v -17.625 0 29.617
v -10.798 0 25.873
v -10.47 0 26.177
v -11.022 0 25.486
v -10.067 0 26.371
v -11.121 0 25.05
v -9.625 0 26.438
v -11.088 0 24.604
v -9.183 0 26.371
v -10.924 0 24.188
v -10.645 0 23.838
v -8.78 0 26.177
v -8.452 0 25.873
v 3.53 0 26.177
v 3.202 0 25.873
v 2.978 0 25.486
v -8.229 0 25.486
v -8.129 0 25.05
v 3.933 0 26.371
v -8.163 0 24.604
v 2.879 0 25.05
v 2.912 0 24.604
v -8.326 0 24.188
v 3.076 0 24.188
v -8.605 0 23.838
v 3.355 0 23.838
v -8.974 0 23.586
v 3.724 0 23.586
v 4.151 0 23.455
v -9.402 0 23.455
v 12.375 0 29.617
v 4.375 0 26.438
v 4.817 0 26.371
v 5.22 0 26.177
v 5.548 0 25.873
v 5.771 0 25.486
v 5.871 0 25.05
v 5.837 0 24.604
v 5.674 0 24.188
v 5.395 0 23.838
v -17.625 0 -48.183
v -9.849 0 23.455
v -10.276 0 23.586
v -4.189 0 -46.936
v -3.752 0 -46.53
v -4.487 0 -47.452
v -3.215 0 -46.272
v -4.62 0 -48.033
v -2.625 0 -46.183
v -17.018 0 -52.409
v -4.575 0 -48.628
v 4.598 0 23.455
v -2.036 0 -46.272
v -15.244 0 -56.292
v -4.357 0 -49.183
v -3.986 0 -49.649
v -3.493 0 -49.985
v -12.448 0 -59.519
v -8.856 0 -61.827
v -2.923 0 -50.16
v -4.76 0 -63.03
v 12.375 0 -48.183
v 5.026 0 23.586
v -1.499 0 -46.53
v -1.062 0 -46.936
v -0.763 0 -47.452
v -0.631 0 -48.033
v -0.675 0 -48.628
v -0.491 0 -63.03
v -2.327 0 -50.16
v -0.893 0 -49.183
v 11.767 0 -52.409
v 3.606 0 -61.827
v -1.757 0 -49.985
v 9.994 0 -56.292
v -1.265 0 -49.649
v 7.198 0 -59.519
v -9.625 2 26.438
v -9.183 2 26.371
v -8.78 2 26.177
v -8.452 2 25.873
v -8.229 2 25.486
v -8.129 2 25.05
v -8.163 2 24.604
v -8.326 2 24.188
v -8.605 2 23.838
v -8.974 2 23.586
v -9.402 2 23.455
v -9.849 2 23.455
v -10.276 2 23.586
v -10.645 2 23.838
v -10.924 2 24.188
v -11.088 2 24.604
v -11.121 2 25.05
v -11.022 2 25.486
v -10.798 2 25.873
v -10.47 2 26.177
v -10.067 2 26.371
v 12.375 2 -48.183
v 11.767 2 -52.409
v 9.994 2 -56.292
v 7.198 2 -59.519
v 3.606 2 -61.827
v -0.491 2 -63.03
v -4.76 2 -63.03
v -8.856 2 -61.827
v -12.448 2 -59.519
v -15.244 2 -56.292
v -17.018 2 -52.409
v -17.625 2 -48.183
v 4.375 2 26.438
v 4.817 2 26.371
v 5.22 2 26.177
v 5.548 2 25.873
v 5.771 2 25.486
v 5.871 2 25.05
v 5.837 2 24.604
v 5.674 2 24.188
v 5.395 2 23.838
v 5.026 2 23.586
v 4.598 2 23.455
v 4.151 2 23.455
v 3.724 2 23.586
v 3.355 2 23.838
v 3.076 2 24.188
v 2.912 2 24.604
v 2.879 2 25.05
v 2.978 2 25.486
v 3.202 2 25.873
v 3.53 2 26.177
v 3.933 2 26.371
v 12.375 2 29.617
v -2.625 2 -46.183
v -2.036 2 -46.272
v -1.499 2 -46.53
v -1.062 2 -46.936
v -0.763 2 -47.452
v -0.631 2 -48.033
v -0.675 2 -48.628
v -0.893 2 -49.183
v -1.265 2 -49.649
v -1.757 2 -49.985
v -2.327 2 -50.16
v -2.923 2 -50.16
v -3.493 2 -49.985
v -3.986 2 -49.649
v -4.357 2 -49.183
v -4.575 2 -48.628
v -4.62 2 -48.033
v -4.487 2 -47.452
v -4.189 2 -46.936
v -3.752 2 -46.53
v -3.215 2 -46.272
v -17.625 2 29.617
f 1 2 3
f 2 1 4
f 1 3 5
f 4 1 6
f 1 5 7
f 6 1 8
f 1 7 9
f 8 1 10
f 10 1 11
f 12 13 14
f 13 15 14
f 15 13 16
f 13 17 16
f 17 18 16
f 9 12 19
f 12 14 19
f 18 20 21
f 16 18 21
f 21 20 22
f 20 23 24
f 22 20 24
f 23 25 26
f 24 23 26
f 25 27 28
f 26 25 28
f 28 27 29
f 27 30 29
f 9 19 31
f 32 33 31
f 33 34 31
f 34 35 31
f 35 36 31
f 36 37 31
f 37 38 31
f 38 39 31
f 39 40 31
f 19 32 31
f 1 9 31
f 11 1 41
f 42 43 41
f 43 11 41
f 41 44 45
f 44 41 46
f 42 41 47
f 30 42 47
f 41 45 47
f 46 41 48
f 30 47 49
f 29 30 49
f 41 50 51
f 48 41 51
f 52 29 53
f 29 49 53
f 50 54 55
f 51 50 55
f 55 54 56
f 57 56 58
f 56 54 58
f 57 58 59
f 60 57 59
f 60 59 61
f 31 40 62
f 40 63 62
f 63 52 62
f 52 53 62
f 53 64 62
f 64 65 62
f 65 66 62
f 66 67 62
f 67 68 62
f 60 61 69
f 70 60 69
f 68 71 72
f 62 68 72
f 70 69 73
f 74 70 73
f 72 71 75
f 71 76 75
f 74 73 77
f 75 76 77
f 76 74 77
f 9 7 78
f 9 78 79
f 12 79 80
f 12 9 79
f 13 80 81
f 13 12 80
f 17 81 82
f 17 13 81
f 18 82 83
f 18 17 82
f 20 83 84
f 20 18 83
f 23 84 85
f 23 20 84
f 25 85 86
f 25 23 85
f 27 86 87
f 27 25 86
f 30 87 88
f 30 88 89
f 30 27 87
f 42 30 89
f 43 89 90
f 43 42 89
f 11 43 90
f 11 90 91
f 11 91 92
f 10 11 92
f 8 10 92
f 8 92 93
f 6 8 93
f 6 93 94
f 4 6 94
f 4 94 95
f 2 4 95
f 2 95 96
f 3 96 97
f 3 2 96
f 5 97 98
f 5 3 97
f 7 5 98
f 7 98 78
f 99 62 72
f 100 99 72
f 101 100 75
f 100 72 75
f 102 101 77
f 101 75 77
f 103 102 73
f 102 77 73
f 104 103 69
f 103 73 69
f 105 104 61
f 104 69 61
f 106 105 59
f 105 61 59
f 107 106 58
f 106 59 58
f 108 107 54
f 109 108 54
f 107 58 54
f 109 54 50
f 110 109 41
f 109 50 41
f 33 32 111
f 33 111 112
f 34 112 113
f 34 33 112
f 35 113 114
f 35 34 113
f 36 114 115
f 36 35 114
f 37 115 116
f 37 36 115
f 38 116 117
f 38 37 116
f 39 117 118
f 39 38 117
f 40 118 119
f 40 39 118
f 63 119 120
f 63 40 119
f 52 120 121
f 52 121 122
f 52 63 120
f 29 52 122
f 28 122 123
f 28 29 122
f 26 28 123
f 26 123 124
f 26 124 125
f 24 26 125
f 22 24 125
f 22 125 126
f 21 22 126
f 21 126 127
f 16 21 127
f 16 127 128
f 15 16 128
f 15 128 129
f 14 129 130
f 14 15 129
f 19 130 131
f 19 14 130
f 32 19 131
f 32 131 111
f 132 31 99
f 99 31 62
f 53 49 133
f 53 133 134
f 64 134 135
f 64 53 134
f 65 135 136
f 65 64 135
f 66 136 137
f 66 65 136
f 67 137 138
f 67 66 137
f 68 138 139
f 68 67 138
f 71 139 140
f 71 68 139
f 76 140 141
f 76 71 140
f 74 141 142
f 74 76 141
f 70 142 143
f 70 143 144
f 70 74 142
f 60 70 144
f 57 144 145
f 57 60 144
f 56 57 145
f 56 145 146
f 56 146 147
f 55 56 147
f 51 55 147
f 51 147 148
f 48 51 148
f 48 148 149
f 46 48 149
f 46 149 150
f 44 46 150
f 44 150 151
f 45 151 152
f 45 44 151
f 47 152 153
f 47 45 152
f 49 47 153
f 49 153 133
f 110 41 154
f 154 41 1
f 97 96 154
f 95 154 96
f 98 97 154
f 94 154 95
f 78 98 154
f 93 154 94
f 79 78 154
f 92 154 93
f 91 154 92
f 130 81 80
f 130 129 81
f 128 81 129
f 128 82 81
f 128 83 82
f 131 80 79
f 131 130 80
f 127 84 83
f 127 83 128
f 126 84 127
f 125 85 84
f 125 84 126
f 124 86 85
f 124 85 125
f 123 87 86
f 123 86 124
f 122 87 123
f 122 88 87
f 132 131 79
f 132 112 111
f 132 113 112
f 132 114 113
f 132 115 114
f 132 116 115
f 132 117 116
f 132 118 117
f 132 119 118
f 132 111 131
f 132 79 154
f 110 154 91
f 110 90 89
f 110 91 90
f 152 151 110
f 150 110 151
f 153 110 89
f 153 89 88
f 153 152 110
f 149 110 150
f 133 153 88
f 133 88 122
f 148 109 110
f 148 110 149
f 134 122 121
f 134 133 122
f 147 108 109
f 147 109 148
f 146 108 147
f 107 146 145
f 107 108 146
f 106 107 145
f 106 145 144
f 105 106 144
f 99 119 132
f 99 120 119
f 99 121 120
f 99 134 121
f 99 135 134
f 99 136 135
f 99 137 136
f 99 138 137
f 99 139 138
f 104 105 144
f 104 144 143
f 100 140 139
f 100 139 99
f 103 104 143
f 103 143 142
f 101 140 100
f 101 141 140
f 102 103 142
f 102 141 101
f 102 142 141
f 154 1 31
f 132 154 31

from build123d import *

# Parameters (mm, degrees)
SKETCH_1_R      = 1.5
SKETCH_1_R_2    = 2
EXTRUDE_1_DEPTH = 2


with BuildPart() as part:
    # Эскиз1 → Бобышка-Вытянуть1 (new body)
    with BuildSketch(Plane(origin=(0, 0, 0), x_dir=(1, 0, 0), z_dir=(0, 1, 0))):
        with BuildLine():
            Line((-17.625227915, -29.617278809), (12.374772085, -29.617278809))
            Line((12.374772085, -29.617278809), (12.374772085, 48.182721191))
            ThreePointArc((12.374772085, 48.182721191), (-2.625227915, 63.182721191), (-17.625227915, 48.182721191))
            Line((-17.625227915, 48.182721191), (-17.625227915, -29.617278809))
        make_face()
        with Locations(Location((-9.625227915, -24.937945637, 0), (0, 0, 270))):
            Circle(SKETCH_1_R, mode=Mode.SUBTRACT)
        with Locations(Location((4.374772085, -24.937945637, 0), (0, 0, 270))):
            Circle(SKETCH_1_R, mode=Mode.SUBTRACT)
        with Locations(Location((-2.625227915, 48.182721191, 0), (0, 0, 270))):
            Circle(SKETCH_1_R_2, mode=Mode.SUBTRACT)
    extrude(amount=EXTRUDE_1_DEPTH)


solid = part.part
